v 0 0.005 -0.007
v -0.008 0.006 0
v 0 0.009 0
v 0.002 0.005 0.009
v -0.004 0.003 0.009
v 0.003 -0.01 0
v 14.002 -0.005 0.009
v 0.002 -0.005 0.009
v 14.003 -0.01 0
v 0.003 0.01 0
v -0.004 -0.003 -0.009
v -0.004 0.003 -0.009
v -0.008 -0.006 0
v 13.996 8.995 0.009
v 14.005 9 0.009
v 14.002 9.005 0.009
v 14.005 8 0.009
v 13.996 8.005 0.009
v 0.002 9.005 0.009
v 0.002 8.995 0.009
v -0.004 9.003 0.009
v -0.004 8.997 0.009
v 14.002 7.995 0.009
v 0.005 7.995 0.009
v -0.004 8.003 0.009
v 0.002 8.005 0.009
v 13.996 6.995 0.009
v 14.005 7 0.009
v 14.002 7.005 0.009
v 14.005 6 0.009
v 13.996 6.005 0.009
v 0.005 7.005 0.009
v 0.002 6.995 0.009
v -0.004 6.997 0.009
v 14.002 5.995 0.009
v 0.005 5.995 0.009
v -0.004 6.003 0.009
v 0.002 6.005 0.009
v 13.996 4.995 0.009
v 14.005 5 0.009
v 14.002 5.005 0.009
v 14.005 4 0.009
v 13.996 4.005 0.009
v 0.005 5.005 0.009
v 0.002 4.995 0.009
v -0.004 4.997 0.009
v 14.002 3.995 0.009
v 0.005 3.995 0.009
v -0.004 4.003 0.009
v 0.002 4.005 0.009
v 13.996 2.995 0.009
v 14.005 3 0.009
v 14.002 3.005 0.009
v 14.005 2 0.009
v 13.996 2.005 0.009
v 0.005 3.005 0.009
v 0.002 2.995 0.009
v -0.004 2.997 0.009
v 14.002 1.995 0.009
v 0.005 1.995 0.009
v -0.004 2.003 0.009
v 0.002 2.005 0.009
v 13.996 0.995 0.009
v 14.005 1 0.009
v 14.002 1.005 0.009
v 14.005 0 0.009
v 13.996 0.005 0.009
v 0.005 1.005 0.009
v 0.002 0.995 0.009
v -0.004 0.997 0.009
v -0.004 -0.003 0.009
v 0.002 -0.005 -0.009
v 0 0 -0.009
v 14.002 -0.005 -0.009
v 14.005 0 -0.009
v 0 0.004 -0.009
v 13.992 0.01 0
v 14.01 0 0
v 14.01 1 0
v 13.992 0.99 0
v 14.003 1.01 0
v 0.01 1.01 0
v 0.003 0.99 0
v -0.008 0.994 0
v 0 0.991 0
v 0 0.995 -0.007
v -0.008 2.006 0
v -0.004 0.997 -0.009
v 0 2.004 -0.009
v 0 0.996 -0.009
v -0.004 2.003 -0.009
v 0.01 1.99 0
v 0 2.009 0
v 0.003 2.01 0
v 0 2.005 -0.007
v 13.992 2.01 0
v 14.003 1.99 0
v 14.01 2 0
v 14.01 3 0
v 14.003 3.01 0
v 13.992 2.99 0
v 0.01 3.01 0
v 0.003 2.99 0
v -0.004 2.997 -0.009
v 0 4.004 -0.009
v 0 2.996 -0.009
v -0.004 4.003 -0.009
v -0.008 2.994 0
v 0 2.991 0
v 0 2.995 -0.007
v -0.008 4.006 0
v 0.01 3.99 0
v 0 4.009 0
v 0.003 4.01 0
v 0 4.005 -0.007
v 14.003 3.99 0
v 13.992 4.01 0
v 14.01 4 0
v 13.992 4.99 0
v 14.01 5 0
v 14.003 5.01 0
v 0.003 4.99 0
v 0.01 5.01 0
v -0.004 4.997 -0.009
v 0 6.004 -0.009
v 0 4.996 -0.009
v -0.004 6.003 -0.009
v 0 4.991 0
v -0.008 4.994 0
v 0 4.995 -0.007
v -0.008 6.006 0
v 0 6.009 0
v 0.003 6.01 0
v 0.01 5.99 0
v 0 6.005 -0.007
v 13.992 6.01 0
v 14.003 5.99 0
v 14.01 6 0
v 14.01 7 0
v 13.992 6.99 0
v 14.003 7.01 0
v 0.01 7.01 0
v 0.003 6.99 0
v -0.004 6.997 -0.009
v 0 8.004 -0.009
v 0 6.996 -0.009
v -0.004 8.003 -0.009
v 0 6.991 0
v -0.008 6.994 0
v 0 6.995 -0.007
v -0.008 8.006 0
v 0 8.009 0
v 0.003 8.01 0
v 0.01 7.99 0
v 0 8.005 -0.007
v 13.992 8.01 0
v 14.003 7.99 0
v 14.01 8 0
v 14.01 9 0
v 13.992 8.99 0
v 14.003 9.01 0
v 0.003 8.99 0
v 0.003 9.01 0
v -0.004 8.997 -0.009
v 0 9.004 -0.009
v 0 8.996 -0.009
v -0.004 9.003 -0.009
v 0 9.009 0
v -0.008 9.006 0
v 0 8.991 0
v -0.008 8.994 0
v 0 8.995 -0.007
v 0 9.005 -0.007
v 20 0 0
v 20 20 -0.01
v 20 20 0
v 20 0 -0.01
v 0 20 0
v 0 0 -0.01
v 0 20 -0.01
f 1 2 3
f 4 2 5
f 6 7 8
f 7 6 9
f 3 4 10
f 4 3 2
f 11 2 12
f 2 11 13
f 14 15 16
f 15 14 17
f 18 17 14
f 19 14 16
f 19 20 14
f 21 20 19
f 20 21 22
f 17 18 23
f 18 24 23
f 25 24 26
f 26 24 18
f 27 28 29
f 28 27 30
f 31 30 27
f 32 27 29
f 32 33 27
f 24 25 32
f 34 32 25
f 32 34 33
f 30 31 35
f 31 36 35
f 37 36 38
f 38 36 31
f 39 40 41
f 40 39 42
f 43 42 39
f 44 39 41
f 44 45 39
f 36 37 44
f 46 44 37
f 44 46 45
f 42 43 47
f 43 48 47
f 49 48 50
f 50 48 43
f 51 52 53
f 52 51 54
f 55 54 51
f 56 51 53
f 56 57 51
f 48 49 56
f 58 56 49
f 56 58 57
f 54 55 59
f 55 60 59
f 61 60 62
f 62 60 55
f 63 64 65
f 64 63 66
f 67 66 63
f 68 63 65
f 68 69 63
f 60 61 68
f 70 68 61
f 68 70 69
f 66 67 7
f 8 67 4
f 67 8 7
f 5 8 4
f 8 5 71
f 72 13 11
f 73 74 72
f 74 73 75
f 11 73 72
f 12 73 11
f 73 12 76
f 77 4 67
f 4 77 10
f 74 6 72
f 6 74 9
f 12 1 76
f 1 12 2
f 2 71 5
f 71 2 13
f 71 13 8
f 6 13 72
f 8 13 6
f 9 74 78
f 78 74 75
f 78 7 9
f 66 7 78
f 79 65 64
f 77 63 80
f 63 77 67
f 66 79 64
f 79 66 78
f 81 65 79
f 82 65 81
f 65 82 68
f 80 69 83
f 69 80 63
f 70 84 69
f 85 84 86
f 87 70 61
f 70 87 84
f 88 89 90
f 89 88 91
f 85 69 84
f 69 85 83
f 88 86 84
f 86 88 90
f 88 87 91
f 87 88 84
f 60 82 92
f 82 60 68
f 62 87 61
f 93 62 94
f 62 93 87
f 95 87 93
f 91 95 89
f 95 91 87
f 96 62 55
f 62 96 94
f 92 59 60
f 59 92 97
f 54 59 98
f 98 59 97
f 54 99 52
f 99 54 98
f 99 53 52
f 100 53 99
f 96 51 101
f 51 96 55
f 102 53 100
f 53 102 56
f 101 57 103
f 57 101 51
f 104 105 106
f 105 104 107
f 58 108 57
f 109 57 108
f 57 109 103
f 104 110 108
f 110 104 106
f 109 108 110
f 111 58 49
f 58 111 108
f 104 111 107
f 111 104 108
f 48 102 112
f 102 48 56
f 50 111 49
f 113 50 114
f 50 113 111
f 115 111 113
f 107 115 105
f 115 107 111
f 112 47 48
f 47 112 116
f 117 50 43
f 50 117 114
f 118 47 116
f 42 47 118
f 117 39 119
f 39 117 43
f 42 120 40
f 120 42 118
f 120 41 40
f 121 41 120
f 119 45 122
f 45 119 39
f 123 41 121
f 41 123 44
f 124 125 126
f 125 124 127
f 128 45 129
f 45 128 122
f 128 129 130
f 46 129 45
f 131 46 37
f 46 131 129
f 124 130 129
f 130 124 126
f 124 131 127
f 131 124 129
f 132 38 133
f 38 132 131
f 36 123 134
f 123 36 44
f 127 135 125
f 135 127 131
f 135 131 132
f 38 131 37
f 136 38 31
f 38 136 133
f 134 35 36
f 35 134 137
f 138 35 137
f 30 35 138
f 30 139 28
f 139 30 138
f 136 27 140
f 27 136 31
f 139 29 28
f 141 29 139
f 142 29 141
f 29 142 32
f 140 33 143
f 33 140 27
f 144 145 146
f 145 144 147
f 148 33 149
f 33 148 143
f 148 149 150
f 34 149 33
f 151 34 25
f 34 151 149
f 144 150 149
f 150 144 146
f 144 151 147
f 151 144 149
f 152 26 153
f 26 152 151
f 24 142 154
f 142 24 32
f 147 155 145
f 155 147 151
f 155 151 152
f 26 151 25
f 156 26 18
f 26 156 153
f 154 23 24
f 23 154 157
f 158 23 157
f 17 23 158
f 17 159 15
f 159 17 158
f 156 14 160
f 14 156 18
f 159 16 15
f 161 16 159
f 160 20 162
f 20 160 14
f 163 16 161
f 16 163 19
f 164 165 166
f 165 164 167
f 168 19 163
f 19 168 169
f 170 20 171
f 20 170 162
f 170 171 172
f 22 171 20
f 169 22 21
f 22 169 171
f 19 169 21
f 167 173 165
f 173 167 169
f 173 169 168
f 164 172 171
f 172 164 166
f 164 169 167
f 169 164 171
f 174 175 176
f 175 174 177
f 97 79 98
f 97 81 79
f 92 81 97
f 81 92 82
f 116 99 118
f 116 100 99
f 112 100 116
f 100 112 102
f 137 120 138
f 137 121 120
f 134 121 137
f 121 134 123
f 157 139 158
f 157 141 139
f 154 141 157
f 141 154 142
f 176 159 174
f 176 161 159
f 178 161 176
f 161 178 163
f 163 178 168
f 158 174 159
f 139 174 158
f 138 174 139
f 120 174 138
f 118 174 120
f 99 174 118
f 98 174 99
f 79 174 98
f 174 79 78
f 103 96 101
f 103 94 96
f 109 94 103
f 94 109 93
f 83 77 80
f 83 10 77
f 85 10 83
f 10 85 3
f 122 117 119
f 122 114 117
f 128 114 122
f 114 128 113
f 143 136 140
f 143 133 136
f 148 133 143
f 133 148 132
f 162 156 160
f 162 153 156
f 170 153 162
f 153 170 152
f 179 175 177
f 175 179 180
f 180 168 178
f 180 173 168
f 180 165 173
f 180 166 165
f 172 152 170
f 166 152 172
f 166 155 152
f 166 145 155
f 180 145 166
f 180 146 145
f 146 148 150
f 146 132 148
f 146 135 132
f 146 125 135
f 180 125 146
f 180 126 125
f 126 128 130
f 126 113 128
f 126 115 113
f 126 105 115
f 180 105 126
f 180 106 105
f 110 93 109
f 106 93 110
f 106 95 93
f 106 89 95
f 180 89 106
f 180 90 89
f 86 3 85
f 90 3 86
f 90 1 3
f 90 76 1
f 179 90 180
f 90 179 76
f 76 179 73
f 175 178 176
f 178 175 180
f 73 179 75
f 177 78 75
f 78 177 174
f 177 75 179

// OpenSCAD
hull(){
    translate([0, 0]) sphere(0.01);
    translate([1, 0]) sphere(0.01);
}
hull(){
    translate([1, 0]) sphere(0.01);
    translate([2, 0]) sphere(0.01);
}
hull(){
    translate([2, 0]) sphere(0.01);
    translate([3, 0]) sphere(0.01);
}
hull(){
    translate([3, 0]) sphere(0.01);
    translate([4, 0]) sphere(0.01);
}
hull(){
    translate([4, 0]) sphere(0.01);
    translate([5, 0]) sphere(0.01);
}
hull(){
    translate([5, 0]) sphere(0.01);
    translate([6, 0]) sphere(0.01);
}
hull(){
    translate([6, 0]) sphere(0.01);
    translate([7, 0]) sphere(0.01);
}
hull(){
    translate([7, 0]) sphere(0.01);
    translate([8, 0]) sphere(0.01);
}
hull(){
    translate([8, 0]) sphere(0.01);
    translate([9, 0]) sphere(0.01);
}
hull(){
    translate([9, 0]) sphere(0.01);
    translate([10, 0]) sphere(0.01);
}
hull(){
    translate([10, 0]) sphere(0.01);
    translate([11, 0]) sphere(0.01);
}
hull(){
    translate([11, 0]) sphere(0.01);
    translate([12, 0]) sphere(0.01);
}
hull(){
    translate([12, 0]) sphere(0.01);
    translate([13, 0]) sphere(0.01);
}
hull(){
    translate([13, 0]) sphere(0.01);
    translate([14, 0]) sphere(0.01);
}
hull(){
    translate([14, 0]) sphere(0.01);
    translate([14, 1]) sphere(0.01);
}
hull(){
    translate([14, 1]) sphere(0.01);
    translate([13, 1]) sphere(0.01);
}
hull(){
    translate([13, 1]) sphere(0.01);
    translate([12, 1]) sphere(0.01);
}
hull(){
    translate([12, 1]) sphere(0.01);
    translate([11, 1]) sphere(0.01);
}
hull(){
    translate([11, 1]) sphere(0.01);
    translate([10, 1]) sphere(0.01);
}
hull(){
    translate([10, 1]) sphere(0.01);
    translate([9, 1]) sphere(0.01);
}
hull(){
    translate([9, 1]) sphere(0.01);
    translate([8, 1]) sphere(0.01);
}
hull(){
    translate([8, 1]) sphere(0.01);
    translate([7, 1]) sphere(0.01);
}
hull(){
    translate([7, 1]) sphere(0.01);
    translate([6, 1]) sphere(0.01);
}
hull(){
    translate([6, 1]) sphere(0.01);
    translate([5, 1]) sphere(0.01);
}
hull(){
    translate([5, 1]) sphere(0.01);
    translate([4, 1]) sphere(0.01);
}
hull(){
    translate([4, 1]) sphere(0.01);
    translate([3, 1]) sphere(0.01);
}
hull(){
    translate([3, 1]) sphere(0.01);
    translate([2, 1]) sphere(0.01);
}
hull(){
    translate([2, 1]) sphere(0.01);
    translate([1, 1]) sphere(0.01);
}
hull(){
    translate([1, 1]) sphere(0.01);
    translate([0, 1]) sphere(0.01);
}
hull(){
    translate([0, 1]) sphere(0.01);
    translate([0, 2]) sphere(0.01);
}
hull(){
    translate([0, 2]) sphere(0.01);
    translate([1, 2]) sphere(0.01);
}
hull(){
    translate([1, 2]) sphere(0.01);
    translate([2, 2]) sphere(0.01);
}
hull(){
    translate([2, 2]) sphere(0.01);
    translate([3, 2]) sphere(0.01);
}
hull(){
    translate([3, 2]) sphere(0.01);
    translate([4, 2]) sphere(0.01);
}
hull(){
    translate([4, 2]) sphere(0.01);
    translate([5, 2]) sphere(0.01);
}
hull(){
    translate([5, 2]) sphere(0.01);
    translate([6, 2]) sphere(0.01);
}
hull(){
    translate([6, 2]) sphere(0.01);
    translate([7, 2]) sphere(0.01);
}
hull(){
    translate([7, 2]) sphere(0.01);
    translate([8, 2]) sphere(0.01);
}
hull(){
    translate([8, 2]) sphere(0.01);
    translate([9, 2]) sphere(0.01);
}
hull(){
    translate([9, 2]) sphere(0.01);
    translate([10, 2]) sphere(0.01);
}
hull(){
    translate([10, 2]) sphere(0.01);
    translate([11, 2]) sphere(0.01);
}
hull(){
    translate([11, 2]) sphere(0.01);
    translate([12, 2]) sphere(0.01);
}
hull(){
    translate([12, 2]) sphere(0.01);
    translate([13, 2]) sphere(0.01);
}
hull(){
    translate([13, 2]) sphere(0.01);
    translate([14, 2]) sphere(0.01);
}
hull(){
    translate([14, 2]) sphere(0.01);
    translate([14, 3]) sphere(0.01);
}
hull(){
    translate([14, 3]) sphere(0.01);
    translate([13, 3]) sphere(0.01);
}
hull(){
    translate([13, 3]) sphere(0.01);
    translate([12, 3]) sphere(0.01);
}
hull(){
    translate([12, 3]) sphere(0.01);
    translate([11, 3]) sphere(0.01);
}
hull(){
    translate([11, 3]) sphere(0.01);
    translate([10, 3]) sphere(0.01);
}
hull(){
    translate([10, 3]) sphere(0.01);
    translate([9, 3]) sphere(0.01);
}
hull(){
    translate([9, 3]) sphere(0.01);
    translate([8, 3]) sphere(0.01);
}
hull(){
    translate([8, 3]) sphere(0.01);
    translate([7, 3]) sphere(0.01);
}
hull(){
    translate([7, 3]) sphere(0.01);
    translate([6, 3]) sphere(0.01);
}
hull(){
    translate([6, 3]) sphere(0.01);
    translate([5, 3]) sphere(0.01);
}
hull(){
    translate([5, 3]) sphere(0.01);
    translate([4, 3]) sphere(0.01);
}
hull(){
    translate([4, 3]) sphere(0.01);
    translate([3, 3]) sphere(0.01);
}
hull(){
    translate([3, 3]) sphere(0.01);
    translate([2, 3]) sphere(0.01);
}
hull(){
    translate([2, 3]) sphere(0.01);
    translate([1, 3]) sphere(0.01);
}
hull(){
    translate([1, 3]) sphere(0.01);
    translate([0, 3]) sphere(0.01);
}
hull(){
    translate([0, 3]) sphere(0.01);
    translate([0, 4]) sphere(0.01);
}
hull(){
    translate([0, 4]) sphere(0.01);
    translate([1, 4]) sphere(0.01);
}
hull(){
    translate([1, 4]) sphere(0.01);
    translate([2, 4]) sphere(0.01);
}
hull(){
    translate([2, 4]) sphere(0.01);
    translate([3, 4]) sphere(0.01);
}
hull(){
    translate([3, 4]) sphere(0.01);
    translate([4, 4]) sphere(0.01);
}
hull(){
    translate([4, 4]) sphere(0.01);
    translate([5, 4]) sphere(0.01);
}
hull(){
    translate([5, 4]) sphere(0.01);
    translate([6, 4]) sphere(0.01);
}
hull(){
    translate([6, 4]) sphere(0.01);
    translate([7, 4]) sphere(0.01);
}
hull(){
    translate([7, 4]) sphere(0.01);
    translate([8, 4]) sphere(0.01);
}
hull(){
    translate([8, 4]) sphere(0.01);
    translate([9, 4]) sphere(0.01);
}
hull(){
    translate([9, 4]) sphere(0.01);
    translate([10, 4]) sphere(0.01);
}
hull(){
    translate([10, 4]) sphere(0.01);
    translate([11, 4]) sphere(0.01);
}
hull(){
    translate([11, 4]) sphere(0.01);
    translate([12, 4]) sphere(0.01);
}
hull(){
    translate([12, 4]) sphere(0.01);
    translate([13, 4]) sphere(0.01);
}
hull(){
    translate([13, 4]) sphere(0.01);
    translate([14, 4]) sphere(0.01);
}
hull(){
    translate([14, 4]) sphere(0.01);
    translate([14, 5]) sphere(0.01);
}
hull(){
    translate([14, 5]) sphere(0.01);
    translate([13, 5]) sphere(0.01);
}
hull(){
    translate([13, 5]) sphere(0.01);
    translate([12, 5]) sphere(0.01);
}
hull(){
    translate([12, 5]) sphere(0.01);
    translate([11, 5]) sphere(0.01);
}
hull(){
    translate([11, 5]) sphere(0.01);
    translate([10, 5]) sphere(0.01);
}
hull(){
    translate([10, 5]) sphere(0.01);
    translate([9, 5]) sphere(0.01);
}
hull(){
    translate([9, 5]) sphere(0.01);
    translate([8, 5]) sphere(0.01);
}
hull(){
    translate([8, 5]) sphere(0.01);
    translate([7, 5]) sphere(0.01);
}
hull(){
    translate([7, 5]) sphere(0.01);
    translate([6, 5]) sphere(0.01);
}
hull(){
    translate([6, 5]) sphere(0.01);
    translate([5, 5]) sphere(0.01);
}
hull(){
    translate([5, 5]) sphere(0.01);
    translate([4, 5]) sphere(0.01);
}
hull(){
    translate([4, 5]) sphere(0.01);
    translate([3, 5]) sphere(0.01);
}
hull(){
    translate([3, 5]) sphere(0.01);
    translate([2, 5]) sphere(0.01);
}
hull(){
    translate([2, 5]) sphere(0.01);
    translate([1, 5]) sphere(0.01);
}
hull(){
    translate([1, 5]) sphere(0.01);
    translate([0, 5]) sphere(0.01);
}
hull(){
    translate([0, 5]) sphere(0.01);
    translate([0, 6]) sphere(0.01);
}
hull(){
    translate([0, 6]) sphere(0.01);
    translate([1, 6]) sphere(0.01);
}
hull(){
    translate([1, 6]) sphere(0.01);
    translate([2, 6]) sphere(0.01);
}
hull(){
    translate([2, 6]) sphere(0.01);
    translate([3, 6]) sphere(0.01);
}
hull(){
    translate([3, 6]) sphere(0.01);
    translate([4, 6]) sphere(0.01);
}
hull(){
    translate([4, 6]) sphere(0.01);
    translate([5, 6]) sphere(0.01);
}
hull(){
    translate([5, 6]) sphere(0.01);
    translate([6, 6]) sphere(0.01);
}
hull(){
    translate([6, 6]) sphere(0.01);
    translate([7, 6]) sphere(0.01);
}
hull(){
    translate([7, 6]) sphere(0.01);
    translate([8, 6]) sphere(0.01);
}
hull(){
    translate([8, 6]) sphere(0.01);
    translate([9, 6]) sphere(0.01);
}
hull(){
    translate([9, 6]) sphere(0.01);
    translate([10, 6]) sphere(0.01);
}
hull(){
    translate([10, 6]) sphere(0.01);
    translate([11, 6]) sphere(0.01);
}
hull(){
    translate([11, 6]) sphere(0.01);
    translate([12, 6]) sphere(0.01);
}
hull(){
    translate([12, 6]) sphere(0.01);
    translate([13, 6]) sphere(0.01);
}
hull(){
    translate([13, 6]) sphere(0.01);
    translate([14, 6]) sphere(0.01);
}
hull(){
    translate([14, 6]) sphere(0.01);
    translate([14, 7]) sphere(0.01);
}
hull(){
    translate([14, 7]) sphere(0.01);
    translate([13, 7]) sphere(0.01);
}
hull(){
    translate([13, 7]) sphere(0.01);
    translate([12, 7]) sphere(0.01);
}
hull(){
    translate([12, 7]) sphere(0.01);
    translate([11, 7]) sphere(0.01);
}
hull(){
    translate([11, 7]) sphere(0.01);
    translate([10, 7]) sphere(0.01);
}
hull(){
    translate([10, 7]) sphere(0.01);
    translate([9, 7]) sphere(0.01);
}
hull(){
    translate([9, 7]) sphere(0.01);
    translate([8, 7]) sphere(0.01);
}
hull(){
    translate([8, 7]) sphere(0.01);
    translate([7, 7]) sphere(0.01);
}
hull(){
    translate([7, 7]) sphere(0.01);
    translate([6, 7]) sphere(0.01);
}
hull(){
    translate([6, 7]) sphere(0.01);
    translate([5, 7]) sphere(0.01);
}
hull(){
    translate([5, 7]) sphere(0.01);
    translate([4, 7]) sphere(0.01);
}
hull(){
    translate([4, 7]) sphere(0.01);
    translate([3, 7]) sphere(0.01);
}
hull(){
    translate([3, 7]) sphere(0.01);
    translate([2, 7]) sphere(0.01);
}
hull(){
    translate([2, 7]) sphere(0.01);
    translate([1, 7]) sphere(0.01);
}
hull(){
    translate([1, 7]) sphere(0.01);
    translate([0, 7]) sphere(0.01);
}
hull(){
    translate([0, 7]) sphere(0.01);
    translate([0, 8]) sphere(0.01);
}
hull(){
    translate([0, 8]) sphere(0.01);
    translate([1, 8]) sphere(0.01);
}
hull(){
    translate([1, 8]) sphere(0.01);
    translate([2, 8]) sphere(0.01);
}
hull(){
    translate([2, 8]) sphere(0.01);
    translate([3, 8]) sphere(0.01);
}
hull(){
    translate([3, 8]) sphere(0.01);
    translate([4, 8]) sphere(0.01);
}
hull(){
    translate([4, 8]) sphere(0.01);
    translate([5, 8]) sphere(0.01);
}
hull(){
    translate([5, 8]) sphere(0.01);
    translate([6, 8]) sphere(0.01);
}
hull(){
    translate([6, 8]) sphere(0.01);
    translate([7, 8]) sphere(0.01);
}
hull(){
    translate([7, 8]) sphere(0.01);
    translate([8, 8]) sphere(0.01);
}
hull(){
    translate([8, 8]) sphere(0.01);
    translate([9, 8]) sphere(0.01);
}
hull(){
    translate([9, 8]) sphere(0.01);
    translate([10, 8]) sphere(0.01);
}
hull(){
    translate([10, 8]) sphere(0.01);
    translate([11, 8]) sphere(0.01);
}
hull(){
    translate([11, 8]) sphere(0.01);
    translate([12, 8]) sphere(0.01);
}
hull(){
    translate([12, 8]) sphere(0.01);
    translate([13, 8]) sphere(0.01);
}
hull(){
    translate([13, 8]) sphere(0.01);
    translate([14, 8]) sphere(0.01);
}
hull(){
    translate([14, 8]) sphere(0.01);
    translate([14, 9]) sphere(0.01);
}
hull(){
    translate([14, 9]) sphere(0.01);
    translate([13, 9]) sphere(0.01);
}
hull(){
    translate([13, 9]) sphere(0.01);
    translate([12, 9]) sphere(0.01);
}
hull(){
    translate([12, 9]) sphere(0.01);
    translate([11, 9]) sphere(0.01);
}
hull(){
    translate([11, 9]) sphere(0.01);
    translate([10, 9]) sphere(0.01);
}
hull(){
    translate([10, 9]) sphere(0.01);
    translate([9, 9]) sphere(0.01);
}
hull(){
    translate([9, 9]) sphere(0.01);
    translate([8, 9]) sphere(0.01);
}
hull(){
    translate([8, 9]) sphere(0.01);
    translate([7, 9]) sphere(0.01);
}
hull(){
    translate([7, 9]) sphere(0.01);
    translate([6, 9]) sphere(0.01);
}
hull(){
    translate([6, 9]) sphere(0.01);
    translate([5, 9]) sphere(0.01);
}
hull(){
    translate([5, 9]) sphere(0.01);
    translate([4, 9]) sphere(0.01);
}
hull(){
    translate([4, 9]) sphere(0.01);
    translate([3, 9]) sphere(0.01);
}
hull(){
    translate([3, 9]) sphere(0.01);
    translate([2, 9]) sphere(0.01);
}
hull(){
    translate([2, 9]) sphere(0.01);
    translate([1, 9]) sphere(0.01);
}
hull(){
    translate([1, 9]) sphere(0.01);
    translate([0, 9]) sphere(0.01);
}
translate([0,0,-0.01]) color([0.1,0.1,0.1]) cube([20,20,0.01]);
